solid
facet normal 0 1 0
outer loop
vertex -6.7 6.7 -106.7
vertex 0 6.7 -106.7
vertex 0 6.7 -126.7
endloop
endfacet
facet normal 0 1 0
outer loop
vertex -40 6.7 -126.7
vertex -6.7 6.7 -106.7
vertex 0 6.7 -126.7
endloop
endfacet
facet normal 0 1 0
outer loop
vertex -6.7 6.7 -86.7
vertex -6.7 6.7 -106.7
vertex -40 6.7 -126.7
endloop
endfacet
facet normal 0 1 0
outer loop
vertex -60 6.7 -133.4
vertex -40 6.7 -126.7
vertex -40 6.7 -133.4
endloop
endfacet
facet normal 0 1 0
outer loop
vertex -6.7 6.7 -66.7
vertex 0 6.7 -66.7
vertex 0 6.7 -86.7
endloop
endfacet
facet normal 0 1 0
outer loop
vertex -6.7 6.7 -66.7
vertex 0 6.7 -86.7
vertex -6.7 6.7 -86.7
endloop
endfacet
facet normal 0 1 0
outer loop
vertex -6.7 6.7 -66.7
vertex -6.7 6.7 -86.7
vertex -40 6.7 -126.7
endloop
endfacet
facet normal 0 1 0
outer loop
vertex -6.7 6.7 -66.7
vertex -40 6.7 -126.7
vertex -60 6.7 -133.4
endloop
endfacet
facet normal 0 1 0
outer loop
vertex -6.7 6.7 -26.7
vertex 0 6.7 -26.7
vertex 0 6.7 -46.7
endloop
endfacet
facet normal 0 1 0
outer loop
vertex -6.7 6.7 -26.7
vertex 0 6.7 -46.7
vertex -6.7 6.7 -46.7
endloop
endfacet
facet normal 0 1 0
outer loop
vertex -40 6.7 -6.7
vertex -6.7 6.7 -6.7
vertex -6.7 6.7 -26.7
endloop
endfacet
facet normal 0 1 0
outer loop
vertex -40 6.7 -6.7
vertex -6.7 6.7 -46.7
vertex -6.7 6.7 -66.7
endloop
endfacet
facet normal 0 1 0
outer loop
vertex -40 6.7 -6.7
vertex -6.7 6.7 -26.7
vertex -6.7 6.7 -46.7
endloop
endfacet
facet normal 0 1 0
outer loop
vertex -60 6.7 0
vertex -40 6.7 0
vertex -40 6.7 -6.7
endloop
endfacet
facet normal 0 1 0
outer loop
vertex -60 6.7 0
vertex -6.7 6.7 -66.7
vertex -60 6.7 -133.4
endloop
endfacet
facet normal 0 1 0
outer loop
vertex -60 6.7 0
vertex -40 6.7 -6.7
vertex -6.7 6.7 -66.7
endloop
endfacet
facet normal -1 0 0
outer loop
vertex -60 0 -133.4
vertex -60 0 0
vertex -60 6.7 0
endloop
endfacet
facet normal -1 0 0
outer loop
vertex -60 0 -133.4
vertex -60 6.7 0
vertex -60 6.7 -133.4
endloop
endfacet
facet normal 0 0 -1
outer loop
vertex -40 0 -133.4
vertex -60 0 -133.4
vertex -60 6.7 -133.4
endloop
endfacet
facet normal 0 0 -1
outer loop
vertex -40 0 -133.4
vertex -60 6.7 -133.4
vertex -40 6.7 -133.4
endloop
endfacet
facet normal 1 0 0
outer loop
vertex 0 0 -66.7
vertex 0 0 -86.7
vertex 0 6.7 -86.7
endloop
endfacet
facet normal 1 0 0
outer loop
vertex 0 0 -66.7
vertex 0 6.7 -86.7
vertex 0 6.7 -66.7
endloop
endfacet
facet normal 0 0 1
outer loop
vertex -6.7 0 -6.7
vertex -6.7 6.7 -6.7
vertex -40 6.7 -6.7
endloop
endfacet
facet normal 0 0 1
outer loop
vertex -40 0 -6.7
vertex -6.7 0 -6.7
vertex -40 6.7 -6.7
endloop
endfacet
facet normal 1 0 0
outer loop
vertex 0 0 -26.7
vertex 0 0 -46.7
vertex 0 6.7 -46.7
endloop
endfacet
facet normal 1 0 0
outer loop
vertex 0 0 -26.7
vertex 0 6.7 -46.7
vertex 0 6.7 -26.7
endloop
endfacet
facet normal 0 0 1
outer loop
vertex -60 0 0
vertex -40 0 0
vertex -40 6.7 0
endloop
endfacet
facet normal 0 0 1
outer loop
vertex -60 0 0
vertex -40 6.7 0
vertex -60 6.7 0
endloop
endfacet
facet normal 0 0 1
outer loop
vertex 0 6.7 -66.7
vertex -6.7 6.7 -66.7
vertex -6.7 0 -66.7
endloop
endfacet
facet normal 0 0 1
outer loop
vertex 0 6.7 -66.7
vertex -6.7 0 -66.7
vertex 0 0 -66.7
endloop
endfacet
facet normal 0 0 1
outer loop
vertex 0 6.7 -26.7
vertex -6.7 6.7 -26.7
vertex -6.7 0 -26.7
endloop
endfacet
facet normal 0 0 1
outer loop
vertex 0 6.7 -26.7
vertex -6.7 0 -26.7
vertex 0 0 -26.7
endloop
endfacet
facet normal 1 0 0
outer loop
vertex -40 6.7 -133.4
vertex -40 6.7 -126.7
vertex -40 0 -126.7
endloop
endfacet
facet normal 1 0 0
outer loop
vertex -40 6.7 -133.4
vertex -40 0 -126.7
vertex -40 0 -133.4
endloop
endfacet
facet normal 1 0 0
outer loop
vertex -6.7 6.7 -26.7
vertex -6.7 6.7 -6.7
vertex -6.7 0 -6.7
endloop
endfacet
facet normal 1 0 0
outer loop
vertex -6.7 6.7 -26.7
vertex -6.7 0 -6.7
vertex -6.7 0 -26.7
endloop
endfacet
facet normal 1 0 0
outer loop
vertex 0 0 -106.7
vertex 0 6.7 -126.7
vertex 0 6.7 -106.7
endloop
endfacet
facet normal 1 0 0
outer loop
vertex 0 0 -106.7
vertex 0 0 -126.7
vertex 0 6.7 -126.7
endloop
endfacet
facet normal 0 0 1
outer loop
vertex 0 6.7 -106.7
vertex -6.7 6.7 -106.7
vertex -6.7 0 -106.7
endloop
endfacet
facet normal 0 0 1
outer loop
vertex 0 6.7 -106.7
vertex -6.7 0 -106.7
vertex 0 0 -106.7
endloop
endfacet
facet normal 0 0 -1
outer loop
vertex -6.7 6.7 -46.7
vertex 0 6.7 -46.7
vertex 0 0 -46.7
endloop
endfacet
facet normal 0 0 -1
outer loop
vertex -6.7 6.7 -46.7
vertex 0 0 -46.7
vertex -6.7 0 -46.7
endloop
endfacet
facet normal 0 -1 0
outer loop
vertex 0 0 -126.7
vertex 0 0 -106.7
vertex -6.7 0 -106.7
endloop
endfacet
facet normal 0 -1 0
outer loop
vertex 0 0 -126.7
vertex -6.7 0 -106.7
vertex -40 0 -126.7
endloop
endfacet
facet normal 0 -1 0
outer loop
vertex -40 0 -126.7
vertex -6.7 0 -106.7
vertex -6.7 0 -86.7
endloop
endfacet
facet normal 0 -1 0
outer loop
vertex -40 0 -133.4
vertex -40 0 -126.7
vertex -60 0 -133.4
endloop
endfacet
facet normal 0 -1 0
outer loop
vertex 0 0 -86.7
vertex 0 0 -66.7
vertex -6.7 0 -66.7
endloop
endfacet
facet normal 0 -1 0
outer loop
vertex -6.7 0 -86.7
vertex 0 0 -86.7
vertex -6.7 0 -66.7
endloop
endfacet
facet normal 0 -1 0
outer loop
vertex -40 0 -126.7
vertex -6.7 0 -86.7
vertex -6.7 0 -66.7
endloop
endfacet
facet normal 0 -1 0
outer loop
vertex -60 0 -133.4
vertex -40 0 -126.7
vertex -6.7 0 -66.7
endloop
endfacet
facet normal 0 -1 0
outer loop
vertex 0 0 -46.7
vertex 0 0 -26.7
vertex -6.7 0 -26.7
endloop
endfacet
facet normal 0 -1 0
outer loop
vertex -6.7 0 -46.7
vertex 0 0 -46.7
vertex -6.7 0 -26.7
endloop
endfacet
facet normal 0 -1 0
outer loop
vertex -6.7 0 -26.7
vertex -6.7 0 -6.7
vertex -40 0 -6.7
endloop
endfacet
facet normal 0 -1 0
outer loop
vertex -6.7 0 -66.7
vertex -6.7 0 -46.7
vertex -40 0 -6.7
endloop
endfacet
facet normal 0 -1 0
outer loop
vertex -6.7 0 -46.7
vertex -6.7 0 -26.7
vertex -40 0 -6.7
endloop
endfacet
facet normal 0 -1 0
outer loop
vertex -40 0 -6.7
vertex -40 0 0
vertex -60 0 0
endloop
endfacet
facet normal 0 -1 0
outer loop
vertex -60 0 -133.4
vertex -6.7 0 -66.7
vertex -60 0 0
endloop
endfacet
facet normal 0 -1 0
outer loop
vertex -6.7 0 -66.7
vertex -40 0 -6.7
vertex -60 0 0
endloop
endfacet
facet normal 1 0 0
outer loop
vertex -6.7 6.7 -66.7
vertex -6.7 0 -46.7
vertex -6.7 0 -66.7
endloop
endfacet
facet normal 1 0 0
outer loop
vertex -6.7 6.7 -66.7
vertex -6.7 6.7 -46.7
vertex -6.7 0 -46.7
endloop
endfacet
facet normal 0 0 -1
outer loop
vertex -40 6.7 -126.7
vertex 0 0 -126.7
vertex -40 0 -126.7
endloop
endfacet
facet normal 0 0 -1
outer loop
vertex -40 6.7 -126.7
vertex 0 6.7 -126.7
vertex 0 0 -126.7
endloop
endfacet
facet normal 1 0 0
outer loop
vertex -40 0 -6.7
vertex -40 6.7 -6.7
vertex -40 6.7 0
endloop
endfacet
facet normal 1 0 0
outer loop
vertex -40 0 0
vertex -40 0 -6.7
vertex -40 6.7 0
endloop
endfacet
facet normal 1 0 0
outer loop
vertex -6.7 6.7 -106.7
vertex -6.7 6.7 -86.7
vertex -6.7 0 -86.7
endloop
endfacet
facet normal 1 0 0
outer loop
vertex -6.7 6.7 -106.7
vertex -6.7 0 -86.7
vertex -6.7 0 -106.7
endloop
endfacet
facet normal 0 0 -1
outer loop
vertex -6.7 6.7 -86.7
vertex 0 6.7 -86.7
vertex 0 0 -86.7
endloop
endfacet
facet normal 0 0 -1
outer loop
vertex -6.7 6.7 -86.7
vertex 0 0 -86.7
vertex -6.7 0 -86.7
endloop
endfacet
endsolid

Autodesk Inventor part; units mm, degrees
ref_plane "YZ Plane" through (0, 0, 0) normal (1, 0, 0) x (0, 1, 0)
ref_plane "XZ Plane" through (0, 0, 0) normal (0, 1, 0) x (-1, 0, 0)
ref_plane "XY Plane" through (0, 0, 0) normal (0, 0, 1) x (1, 0, 0)
sketch "Sketch1" plane through (0, 0, 0) normal (0, 1, 0) x (-1, 0, 0)
  line L0 (0, 0) -> (60, 0)
  line L1 (60, 0) -> (60, -133.4)
  line L2 (60, -133.4) -> (0, -133.4)
  line L3 (0, -133.4) -> (0, 0)
  dimension "d0" = 133.4
  dimension "d1" = 60
extrude "Extrusion1" add sketch "Sketch1" along normal blind 6.7
sketch "Sketch2" plane through (0, 6.7, 0) normal (0, 1, 0) x (1, 0, 0)
  line L0 (0, 0) -> (0, 6.7)
  line L1 (0, 0) -> (0, 133.4) projected
  line L2 (0, 6.7) -> (-6.7, 6.7)
  line L3 (-6.7, 6.7) -> (-6.7, 26.7)
  line L4 (-6.7, 26.7) -> (0, 26.7)
  line L5 (0, 26.7) -> (0, 6.7)
  dimension "d4" = 6.7
  dimension "d5" = 6.7
  dimension "d6" = 20
extrude "Extrusion2" cut sketch "Sketch2" against normal blind 6.7
pattern_linear "Rectangular Pattern1" count 3 spacing 40 along (0, 0, -1) of "Extrusion2"
sketch "Sketch3" plane through (0, 6.7, 0) normal (0, 1, 0) x (1, 0, 0)
  line L0 (0, 0) -> (-60, 0) projected
  line L1 (-60, 0) -> (-40, 0)
  line L2 (-40, 0) -> (-20, 0)
  line L3 (0, 6.7) -> (0, 0) projected
  line L4 (-40, 0) -> (0, 0)
  line L5 (0, 0) -> (0, 6.7)
  line L6 (0, 6.7) -> (-40, 6.7)
  line L7 (-40, 6.7) -> (-40, 0)
  line L8 (-60, 133.4) -> (-40, 133.4)
  line L9 (-60, 133.4) -> (0, 133.4) projected
  line L10 (0, 133.4) -> (0, 106.7) projected
  line L11 (-40, 133.4) -> (0, 133.4)
  line L12 (0, 133.4) -> (0, 126.7)
  line L13 (0, 126.7) -> (-40, 126.7)
  line L14 (-40, 126.7) -> (-40, 133.4)
  dimension "d12" = 20
  dimension "d15" = 20
  dimension "d16" = 6.7
extrude "Extrusion3" cut sketch "Sketch3" against normal blind 6.7
properties part number "b_base_support 3"
